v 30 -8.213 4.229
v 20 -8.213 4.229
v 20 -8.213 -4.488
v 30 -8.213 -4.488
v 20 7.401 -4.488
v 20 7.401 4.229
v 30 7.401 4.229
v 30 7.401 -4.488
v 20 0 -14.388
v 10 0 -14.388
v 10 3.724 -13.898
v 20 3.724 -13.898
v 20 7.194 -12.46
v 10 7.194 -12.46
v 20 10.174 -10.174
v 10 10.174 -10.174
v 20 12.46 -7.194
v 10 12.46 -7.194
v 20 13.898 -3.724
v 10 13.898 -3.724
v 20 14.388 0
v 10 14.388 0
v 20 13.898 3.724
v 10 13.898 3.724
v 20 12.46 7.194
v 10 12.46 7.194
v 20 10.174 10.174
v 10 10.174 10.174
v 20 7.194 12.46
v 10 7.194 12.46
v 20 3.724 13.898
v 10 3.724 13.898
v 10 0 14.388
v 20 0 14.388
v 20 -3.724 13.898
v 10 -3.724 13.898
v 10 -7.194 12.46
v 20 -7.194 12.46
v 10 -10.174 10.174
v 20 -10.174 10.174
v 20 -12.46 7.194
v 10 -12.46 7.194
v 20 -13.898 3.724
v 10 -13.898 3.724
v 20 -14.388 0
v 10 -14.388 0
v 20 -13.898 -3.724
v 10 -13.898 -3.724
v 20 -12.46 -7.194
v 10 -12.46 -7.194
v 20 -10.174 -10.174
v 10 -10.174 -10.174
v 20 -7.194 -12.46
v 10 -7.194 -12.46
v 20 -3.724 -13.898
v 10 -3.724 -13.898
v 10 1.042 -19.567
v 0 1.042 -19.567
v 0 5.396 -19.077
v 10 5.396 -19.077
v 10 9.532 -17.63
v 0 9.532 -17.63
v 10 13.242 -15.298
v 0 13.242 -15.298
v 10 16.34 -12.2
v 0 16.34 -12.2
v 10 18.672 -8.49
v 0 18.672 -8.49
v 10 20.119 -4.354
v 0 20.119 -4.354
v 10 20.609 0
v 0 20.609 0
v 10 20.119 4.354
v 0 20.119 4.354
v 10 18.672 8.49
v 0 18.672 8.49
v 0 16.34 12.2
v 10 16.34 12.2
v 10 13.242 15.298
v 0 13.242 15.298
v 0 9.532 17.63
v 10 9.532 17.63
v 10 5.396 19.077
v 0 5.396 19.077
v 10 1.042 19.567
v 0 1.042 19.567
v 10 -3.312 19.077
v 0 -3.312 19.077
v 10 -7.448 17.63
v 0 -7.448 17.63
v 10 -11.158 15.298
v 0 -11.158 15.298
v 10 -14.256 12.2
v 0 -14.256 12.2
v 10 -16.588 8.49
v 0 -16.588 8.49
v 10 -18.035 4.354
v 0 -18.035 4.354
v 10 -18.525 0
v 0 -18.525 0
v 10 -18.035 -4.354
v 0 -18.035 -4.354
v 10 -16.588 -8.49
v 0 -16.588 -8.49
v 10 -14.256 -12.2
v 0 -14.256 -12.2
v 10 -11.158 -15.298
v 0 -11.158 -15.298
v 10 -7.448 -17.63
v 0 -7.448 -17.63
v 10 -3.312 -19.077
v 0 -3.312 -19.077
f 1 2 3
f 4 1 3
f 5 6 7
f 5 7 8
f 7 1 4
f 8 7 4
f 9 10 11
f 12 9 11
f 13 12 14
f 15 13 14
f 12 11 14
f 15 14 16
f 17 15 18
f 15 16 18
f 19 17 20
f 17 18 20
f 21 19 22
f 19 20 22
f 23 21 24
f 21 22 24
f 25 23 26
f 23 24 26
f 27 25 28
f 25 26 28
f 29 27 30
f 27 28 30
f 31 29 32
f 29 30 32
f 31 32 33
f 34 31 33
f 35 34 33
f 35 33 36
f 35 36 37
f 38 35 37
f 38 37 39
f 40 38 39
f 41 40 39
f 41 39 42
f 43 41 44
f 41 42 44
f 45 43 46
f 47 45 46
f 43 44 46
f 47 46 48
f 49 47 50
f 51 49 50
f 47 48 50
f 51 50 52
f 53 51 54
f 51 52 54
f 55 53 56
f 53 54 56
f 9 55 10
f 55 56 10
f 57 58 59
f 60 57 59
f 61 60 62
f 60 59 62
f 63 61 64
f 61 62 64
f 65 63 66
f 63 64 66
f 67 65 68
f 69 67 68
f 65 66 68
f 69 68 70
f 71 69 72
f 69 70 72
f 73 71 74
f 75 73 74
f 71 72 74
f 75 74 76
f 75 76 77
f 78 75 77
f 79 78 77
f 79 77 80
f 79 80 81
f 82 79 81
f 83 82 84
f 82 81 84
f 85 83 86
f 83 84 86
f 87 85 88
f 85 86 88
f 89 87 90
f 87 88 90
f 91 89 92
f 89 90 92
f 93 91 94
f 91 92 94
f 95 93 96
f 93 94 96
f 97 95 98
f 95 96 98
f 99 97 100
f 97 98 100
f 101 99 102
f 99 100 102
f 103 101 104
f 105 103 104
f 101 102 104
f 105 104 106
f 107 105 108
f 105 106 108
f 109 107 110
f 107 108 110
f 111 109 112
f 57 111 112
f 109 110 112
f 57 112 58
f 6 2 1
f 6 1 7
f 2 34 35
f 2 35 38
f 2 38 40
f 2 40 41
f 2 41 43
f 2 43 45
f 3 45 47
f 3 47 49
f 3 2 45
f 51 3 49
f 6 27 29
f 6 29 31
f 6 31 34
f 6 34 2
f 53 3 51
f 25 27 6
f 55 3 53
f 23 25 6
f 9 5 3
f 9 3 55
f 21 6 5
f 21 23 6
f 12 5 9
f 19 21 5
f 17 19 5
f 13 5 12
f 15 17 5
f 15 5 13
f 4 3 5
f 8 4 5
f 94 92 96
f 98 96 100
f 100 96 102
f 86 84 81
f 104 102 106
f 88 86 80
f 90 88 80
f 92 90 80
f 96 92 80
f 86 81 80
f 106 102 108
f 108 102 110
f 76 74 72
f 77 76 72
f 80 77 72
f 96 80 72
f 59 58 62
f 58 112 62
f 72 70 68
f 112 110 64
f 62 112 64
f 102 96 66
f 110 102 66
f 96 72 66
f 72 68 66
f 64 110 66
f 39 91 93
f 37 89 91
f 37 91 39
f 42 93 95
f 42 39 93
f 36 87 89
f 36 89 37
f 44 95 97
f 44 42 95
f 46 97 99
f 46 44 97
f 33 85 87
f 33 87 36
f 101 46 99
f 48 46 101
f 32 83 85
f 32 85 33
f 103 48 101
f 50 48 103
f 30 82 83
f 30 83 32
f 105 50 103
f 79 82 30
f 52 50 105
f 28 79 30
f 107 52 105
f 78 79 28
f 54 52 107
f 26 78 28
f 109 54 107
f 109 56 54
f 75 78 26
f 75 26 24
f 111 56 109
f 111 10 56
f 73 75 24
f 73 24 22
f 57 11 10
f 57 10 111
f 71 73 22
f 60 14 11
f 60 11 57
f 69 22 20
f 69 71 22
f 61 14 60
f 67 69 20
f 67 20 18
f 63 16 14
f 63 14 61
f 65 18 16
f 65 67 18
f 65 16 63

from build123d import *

# Parameters (mm, degrees)
SKETCH1_R           = 19.567441598
BOSS_EXTRUDE1_DEPTH = 10
SKETCH2_R           = 14.388112676
BOSS_EXTRUDE2_DEPTH = 10
SKETCH3_W           = 8.717473042
SKETCH3_H           = 15.61355637
BOSS_EXTRUDE3_DEPTH = 10


with BuildPart() as part:
    # Sketch1 → Boss-Extrude1 (new body)
    with BuildSketch(Plane(origin=(0, 0, 0), x_dir=(0, 0, -1), z_dir=(1, 0, 0))):
        with Locations((0, 1.041985539)):
            Circle(SKETCH1_R)
    extrude(amount=BOSS_EXTRUDE1_DEPTH)

    # Sketch2 → Boss-Extrude2 (add)
    with BuildSketch(Plane(origin=(10, 0, 0), x_dir=(0, 0, -1), z_dir=(1, 0, 0))):
        Circle(SKETCH2_R)
    extrude(amount=BOSS_EXTRUDE2_DEPTH)

    # Sketch3 → Boss-Extrude3 (add)
    with BuildSketch(Plane(origin=(20, 0, 0), x_dir=(0, 0, -1), z_dir=(1, 0, 0))):
        with Locations((0.129497686, -0.406254906)):
            Rectangle(SKETCH3_W, SKETCH3_H)
    extrude(amount=BOSS_EXTRUDE3_DEPTH)


solid = part.part
